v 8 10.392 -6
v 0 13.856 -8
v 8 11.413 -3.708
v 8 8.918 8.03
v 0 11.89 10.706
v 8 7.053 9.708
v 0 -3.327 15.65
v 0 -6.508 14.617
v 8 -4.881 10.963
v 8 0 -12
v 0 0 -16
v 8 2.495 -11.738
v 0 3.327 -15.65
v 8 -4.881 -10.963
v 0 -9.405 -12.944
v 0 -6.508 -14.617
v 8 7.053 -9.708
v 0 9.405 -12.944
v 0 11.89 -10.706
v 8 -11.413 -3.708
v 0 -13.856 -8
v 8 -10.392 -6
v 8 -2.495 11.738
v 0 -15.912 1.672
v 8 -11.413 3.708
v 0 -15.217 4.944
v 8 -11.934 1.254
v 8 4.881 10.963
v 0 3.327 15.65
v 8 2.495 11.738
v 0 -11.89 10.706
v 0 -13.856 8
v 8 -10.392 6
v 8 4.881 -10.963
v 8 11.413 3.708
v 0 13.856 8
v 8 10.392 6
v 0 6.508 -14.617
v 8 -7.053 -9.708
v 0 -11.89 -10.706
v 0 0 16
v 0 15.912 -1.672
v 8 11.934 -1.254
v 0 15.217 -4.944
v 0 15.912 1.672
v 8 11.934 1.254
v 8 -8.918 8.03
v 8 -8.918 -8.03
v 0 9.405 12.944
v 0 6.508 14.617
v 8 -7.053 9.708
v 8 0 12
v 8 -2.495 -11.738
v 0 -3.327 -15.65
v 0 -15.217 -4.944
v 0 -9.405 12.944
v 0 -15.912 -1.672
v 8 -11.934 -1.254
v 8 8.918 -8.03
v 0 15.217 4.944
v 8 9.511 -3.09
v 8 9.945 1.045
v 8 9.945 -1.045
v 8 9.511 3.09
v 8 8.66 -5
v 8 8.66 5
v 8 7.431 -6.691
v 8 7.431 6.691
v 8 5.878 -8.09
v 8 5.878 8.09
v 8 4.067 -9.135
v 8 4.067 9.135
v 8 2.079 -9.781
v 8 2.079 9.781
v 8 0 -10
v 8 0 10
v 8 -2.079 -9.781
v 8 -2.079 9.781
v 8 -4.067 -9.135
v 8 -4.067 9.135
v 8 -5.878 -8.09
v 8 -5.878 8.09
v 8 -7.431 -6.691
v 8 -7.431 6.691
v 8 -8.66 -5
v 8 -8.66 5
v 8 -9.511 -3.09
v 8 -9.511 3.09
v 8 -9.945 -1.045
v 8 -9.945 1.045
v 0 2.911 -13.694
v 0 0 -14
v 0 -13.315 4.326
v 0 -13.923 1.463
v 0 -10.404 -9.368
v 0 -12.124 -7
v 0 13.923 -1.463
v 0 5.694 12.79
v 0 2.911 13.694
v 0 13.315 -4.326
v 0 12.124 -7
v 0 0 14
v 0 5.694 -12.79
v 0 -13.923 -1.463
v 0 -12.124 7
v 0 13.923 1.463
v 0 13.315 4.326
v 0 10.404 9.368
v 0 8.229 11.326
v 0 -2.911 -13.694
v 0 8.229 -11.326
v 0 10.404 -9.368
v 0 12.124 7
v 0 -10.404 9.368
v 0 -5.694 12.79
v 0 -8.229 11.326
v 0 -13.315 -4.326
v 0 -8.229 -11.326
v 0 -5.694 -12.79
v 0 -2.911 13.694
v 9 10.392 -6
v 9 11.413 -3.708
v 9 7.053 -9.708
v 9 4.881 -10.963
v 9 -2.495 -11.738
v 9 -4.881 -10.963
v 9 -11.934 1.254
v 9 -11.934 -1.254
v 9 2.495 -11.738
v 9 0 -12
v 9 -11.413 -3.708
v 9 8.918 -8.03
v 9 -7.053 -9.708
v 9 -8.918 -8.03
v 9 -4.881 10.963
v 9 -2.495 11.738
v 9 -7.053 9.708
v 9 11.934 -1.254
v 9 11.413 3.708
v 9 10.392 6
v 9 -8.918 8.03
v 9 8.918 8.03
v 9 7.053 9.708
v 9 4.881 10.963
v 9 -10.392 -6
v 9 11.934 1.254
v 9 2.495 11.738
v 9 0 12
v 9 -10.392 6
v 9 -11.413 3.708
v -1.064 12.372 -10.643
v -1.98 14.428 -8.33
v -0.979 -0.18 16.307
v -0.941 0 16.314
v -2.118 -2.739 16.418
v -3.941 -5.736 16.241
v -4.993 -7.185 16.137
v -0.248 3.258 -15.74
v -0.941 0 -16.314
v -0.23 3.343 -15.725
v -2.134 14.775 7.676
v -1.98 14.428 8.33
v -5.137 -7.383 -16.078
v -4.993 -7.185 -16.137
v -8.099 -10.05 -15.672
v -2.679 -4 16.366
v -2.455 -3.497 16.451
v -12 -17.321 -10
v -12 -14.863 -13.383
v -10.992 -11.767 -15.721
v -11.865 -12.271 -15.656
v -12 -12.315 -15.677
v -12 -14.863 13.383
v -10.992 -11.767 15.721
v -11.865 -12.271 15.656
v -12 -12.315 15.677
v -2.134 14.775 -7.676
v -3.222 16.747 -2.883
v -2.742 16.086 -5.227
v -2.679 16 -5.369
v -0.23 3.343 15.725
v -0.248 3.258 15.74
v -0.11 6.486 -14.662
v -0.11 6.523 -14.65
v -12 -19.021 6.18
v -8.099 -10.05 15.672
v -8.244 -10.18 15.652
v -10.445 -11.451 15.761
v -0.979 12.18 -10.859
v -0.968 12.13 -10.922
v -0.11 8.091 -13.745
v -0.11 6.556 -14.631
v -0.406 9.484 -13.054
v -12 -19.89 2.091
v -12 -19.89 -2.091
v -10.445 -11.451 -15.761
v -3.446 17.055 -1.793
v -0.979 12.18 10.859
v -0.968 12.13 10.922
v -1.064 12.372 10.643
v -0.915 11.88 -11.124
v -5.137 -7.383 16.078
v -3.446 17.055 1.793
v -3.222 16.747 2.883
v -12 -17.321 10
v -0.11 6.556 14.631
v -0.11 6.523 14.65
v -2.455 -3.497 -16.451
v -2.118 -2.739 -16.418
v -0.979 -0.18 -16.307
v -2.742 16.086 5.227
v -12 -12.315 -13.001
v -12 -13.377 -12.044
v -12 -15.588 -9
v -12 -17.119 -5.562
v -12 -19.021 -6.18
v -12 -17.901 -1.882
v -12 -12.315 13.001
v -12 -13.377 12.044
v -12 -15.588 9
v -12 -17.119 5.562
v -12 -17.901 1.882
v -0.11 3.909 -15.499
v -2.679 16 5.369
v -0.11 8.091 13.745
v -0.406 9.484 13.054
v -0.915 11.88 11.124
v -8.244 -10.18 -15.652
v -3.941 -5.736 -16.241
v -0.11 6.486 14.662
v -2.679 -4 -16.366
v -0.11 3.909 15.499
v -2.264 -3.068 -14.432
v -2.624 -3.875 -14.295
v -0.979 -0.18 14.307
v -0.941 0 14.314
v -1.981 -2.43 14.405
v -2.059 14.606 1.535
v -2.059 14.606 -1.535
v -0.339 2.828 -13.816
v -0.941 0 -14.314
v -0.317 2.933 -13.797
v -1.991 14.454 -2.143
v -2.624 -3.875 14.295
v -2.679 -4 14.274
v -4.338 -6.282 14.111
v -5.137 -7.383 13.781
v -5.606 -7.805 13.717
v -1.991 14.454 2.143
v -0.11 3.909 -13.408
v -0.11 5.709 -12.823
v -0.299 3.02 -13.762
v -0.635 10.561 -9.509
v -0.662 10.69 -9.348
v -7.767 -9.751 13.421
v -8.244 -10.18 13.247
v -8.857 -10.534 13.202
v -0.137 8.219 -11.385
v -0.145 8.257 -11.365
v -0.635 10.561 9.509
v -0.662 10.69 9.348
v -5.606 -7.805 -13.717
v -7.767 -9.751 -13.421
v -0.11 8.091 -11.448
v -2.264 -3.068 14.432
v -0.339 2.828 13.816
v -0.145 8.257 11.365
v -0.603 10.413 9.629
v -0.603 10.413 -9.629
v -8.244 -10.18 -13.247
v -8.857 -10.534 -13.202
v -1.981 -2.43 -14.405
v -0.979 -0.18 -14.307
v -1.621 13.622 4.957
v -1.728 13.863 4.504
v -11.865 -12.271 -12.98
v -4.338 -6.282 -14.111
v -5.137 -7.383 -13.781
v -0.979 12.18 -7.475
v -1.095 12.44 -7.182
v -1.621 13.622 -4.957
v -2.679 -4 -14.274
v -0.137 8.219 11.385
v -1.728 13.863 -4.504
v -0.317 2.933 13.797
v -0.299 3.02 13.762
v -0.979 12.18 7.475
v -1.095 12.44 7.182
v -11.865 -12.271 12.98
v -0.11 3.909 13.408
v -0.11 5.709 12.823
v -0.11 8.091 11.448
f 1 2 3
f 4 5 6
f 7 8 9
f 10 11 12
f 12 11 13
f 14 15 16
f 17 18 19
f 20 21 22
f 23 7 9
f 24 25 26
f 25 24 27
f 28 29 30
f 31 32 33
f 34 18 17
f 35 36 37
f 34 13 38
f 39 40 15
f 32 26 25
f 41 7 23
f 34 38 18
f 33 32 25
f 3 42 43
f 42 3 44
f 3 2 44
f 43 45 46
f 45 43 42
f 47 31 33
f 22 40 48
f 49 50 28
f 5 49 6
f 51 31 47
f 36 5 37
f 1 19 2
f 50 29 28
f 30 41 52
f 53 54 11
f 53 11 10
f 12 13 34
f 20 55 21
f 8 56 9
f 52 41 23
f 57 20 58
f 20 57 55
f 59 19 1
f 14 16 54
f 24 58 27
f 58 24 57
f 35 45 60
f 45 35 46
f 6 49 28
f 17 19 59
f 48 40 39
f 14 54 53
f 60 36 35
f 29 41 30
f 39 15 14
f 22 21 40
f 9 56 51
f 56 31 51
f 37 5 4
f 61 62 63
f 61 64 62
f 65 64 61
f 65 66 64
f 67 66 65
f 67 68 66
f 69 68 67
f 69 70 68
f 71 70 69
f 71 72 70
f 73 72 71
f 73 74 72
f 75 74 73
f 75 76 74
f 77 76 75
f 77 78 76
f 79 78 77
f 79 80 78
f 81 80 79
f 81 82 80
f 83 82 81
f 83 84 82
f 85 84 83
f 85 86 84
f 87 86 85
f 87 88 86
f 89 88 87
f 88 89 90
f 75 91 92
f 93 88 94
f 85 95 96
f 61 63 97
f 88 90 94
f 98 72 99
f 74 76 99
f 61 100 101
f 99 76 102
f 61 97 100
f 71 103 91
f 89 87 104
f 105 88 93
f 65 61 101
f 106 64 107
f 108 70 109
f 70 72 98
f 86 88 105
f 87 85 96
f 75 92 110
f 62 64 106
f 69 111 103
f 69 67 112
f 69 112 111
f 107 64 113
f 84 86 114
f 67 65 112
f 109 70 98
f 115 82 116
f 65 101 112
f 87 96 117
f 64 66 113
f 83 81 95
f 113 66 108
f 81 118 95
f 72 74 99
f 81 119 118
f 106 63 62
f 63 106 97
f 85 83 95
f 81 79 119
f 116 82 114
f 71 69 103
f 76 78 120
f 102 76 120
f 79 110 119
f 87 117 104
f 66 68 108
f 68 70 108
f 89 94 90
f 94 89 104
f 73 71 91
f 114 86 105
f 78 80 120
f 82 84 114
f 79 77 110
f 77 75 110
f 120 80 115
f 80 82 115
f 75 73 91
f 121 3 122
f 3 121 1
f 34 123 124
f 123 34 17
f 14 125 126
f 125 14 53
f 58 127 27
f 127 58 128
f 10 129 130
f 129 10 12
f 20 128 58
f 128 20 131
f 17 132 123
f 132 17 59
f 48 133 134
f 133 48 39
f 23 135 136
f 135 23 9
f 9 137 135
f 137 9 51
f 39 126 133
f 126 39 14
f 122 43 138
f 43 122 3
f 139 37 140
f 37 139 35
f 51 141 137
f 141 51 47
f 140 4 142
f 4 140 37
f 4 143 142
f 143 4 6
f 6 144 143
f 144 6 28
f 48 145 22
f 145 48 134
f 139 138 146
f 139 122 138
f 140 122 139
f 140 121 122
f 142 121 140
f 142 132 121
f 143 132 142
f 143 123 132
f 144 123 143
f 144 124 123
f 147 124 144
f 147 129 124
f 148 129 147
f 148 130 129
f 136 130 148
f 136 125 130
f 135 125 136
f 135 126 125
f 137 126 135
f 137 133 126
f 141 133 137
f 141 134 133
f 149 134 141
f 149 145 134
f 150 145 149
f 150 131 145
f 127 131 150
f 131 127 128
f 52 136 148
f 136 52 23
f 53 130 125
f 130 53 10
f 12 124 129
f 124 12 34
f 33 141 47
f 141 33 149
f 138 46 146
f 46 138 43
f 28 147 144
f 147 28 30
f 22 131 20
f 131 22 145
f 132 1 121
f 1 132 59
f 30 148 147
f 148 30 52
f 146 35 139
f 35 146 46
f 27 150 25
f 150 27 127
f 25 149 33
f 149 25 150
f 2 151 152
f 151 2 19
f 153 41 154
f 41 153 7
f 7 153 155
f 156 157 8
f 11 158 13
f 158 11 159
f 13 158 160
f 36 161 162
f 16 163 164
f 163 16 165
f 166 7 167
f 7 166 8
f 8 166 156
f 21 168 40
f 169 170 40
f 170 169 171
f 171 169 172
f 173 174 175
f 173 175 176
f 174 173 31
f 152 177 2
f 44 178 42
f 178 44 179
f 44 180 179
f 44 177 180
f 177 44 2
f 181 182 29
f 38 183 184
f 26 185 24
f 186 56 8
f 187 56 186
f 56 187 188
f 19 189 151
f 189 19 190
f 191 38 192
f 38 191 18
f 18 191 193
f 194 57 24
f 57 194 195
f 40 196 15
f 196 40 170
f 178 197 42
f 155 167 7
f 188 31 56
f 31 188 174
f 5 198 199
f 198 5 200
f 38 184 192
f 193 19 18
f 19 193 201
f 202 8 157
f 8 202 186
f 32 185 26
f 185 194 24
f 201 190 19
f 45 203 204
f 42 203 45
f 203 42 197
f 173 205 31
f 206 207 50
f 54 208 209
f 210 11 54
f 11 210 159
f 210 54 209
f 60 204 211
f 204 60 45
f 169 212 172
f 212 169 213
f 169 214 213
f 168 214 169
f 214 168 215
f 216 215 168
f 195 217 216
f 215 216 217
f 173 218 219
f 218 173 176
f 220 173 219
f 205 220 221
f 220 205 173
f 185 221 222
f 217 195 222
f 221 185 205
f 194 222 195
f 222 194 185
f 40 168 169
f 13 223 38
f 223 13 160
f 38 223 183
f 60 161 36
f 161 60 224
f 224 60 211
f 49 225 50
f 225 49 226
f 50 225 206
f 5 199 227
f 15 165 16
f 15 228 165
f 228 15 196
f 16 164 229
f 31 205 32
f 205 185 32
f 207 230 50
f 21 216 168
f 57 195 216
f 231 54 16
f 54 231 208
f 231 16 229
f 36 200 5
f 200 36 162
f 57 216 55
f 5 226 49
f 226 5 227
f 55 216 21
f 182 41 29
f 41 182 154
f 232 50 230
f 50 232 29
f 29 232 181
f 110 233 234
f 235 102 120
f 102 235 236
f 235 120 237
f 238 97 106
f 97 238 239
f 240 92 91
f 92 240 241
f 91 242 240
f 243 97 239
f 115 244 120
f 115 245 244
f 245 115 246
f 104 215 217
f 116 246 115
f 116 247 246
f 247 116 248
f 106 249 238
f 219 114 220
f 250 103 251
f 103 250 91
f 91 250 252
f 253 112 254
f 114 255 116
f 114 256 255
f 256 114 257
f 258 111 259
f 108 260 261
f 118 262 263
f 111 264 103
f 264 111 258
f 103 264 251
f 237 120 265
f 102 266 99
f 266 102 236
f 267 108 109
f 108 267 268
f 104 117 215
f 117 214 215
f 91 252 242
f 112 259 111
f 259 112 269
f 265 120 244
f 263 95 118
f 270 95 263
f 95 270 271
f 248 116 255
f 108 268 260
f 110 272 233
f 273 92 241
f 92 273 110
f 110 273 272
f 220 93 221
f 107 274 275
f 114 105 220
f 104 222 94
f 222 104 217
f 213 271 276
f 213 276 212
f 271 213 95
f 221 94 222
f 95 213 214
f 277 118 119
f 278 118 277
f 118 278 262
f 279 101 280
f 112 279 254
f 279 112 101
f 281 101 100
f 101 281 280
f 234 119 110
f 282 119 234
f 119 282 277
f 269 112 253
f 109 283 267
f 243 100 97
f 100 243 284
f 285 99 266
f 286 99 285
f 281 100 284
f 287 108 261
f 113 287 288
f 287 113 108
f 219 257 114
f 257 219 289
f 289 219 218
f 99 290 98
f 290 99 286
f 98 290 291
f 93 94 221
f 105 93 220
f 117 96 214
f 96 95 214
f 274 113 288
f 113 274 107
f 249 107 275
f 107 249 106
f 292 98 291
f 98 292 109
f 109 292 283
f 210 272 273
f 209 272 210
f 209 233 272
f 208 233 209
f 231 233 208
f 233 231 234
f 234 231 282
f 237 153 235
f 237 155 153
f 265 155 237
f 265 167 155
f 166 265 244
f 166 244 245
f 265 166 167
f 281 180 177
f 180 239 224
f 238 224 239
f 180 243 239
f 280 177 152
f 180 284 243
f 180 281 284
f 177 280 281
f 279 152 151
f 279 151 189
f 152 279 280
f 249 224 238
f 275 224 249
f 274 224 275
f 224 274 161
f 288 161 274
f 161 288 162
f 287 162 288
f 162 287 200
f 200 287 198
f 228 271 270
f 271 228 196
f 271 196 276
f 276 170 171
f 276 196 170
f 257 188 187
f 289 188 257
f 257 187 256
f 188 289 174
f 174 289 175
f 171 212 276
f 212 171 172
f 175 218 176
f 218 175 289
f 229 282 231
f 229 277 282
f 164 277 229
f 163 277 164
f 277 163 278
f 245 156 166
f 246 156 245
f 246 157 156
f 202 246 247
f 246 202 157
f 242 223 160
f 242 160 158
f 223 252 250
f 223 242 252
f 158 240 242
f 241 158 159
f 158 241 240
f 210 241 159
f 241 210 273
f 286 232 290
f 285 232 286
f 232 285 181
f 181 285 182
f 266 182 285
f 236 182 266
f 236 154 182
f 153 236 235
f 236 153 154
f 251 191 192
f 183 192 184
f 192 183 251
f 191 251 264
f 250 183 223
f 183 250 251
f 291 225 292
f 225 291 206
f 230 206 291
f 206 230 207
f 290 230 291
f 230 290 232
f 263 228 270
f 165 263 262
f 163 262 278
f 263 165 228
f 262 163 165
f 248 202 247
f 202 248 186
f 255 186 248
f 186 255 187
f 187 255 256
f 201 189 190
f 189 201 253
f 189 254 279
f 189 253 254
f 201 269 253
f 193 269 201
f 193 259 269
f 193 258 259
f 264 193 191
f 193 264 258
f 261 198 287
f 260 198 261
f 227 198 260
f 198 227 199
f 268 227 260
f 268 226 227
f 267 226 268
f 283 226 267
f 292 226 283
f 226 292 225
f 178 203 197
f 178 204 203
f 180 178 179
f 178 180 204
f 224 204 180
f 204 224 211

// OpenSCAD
//goggles
//union(){}
//intersection(){

//cylinder(height, r1, r2, center=true/false)


union(){

union(){
translate([8,0,0]) rotate([90,90,90]) cylinder(1,12,12);
difference(){
translate([0,0,0]) rotate([90,90,90]) cylinder(8,16,12);
translate([0,0,0]) rotate([90,90,90]) cylinder(8,14,10);
}
}

//translate([-16,0,0])
difference(){
difference(){
translate([-12,0,0]) rotate([90,90,90]) cylinder(12,20,16);
translate([-12,0,0]) rotate([90,90,90]) cylinder(12,18,14);
}


//vertical cylinder cut
translate([-20,6,-20]) rotate([0,0,90]) cylinder(40,20,20);
//sphere cut
//translate([-20,2,0]) sphere(22);
//cylinder cut
//translate([-20,2,0]) rotate([97,90,90]) cylinder(20,28,14);


}
}
